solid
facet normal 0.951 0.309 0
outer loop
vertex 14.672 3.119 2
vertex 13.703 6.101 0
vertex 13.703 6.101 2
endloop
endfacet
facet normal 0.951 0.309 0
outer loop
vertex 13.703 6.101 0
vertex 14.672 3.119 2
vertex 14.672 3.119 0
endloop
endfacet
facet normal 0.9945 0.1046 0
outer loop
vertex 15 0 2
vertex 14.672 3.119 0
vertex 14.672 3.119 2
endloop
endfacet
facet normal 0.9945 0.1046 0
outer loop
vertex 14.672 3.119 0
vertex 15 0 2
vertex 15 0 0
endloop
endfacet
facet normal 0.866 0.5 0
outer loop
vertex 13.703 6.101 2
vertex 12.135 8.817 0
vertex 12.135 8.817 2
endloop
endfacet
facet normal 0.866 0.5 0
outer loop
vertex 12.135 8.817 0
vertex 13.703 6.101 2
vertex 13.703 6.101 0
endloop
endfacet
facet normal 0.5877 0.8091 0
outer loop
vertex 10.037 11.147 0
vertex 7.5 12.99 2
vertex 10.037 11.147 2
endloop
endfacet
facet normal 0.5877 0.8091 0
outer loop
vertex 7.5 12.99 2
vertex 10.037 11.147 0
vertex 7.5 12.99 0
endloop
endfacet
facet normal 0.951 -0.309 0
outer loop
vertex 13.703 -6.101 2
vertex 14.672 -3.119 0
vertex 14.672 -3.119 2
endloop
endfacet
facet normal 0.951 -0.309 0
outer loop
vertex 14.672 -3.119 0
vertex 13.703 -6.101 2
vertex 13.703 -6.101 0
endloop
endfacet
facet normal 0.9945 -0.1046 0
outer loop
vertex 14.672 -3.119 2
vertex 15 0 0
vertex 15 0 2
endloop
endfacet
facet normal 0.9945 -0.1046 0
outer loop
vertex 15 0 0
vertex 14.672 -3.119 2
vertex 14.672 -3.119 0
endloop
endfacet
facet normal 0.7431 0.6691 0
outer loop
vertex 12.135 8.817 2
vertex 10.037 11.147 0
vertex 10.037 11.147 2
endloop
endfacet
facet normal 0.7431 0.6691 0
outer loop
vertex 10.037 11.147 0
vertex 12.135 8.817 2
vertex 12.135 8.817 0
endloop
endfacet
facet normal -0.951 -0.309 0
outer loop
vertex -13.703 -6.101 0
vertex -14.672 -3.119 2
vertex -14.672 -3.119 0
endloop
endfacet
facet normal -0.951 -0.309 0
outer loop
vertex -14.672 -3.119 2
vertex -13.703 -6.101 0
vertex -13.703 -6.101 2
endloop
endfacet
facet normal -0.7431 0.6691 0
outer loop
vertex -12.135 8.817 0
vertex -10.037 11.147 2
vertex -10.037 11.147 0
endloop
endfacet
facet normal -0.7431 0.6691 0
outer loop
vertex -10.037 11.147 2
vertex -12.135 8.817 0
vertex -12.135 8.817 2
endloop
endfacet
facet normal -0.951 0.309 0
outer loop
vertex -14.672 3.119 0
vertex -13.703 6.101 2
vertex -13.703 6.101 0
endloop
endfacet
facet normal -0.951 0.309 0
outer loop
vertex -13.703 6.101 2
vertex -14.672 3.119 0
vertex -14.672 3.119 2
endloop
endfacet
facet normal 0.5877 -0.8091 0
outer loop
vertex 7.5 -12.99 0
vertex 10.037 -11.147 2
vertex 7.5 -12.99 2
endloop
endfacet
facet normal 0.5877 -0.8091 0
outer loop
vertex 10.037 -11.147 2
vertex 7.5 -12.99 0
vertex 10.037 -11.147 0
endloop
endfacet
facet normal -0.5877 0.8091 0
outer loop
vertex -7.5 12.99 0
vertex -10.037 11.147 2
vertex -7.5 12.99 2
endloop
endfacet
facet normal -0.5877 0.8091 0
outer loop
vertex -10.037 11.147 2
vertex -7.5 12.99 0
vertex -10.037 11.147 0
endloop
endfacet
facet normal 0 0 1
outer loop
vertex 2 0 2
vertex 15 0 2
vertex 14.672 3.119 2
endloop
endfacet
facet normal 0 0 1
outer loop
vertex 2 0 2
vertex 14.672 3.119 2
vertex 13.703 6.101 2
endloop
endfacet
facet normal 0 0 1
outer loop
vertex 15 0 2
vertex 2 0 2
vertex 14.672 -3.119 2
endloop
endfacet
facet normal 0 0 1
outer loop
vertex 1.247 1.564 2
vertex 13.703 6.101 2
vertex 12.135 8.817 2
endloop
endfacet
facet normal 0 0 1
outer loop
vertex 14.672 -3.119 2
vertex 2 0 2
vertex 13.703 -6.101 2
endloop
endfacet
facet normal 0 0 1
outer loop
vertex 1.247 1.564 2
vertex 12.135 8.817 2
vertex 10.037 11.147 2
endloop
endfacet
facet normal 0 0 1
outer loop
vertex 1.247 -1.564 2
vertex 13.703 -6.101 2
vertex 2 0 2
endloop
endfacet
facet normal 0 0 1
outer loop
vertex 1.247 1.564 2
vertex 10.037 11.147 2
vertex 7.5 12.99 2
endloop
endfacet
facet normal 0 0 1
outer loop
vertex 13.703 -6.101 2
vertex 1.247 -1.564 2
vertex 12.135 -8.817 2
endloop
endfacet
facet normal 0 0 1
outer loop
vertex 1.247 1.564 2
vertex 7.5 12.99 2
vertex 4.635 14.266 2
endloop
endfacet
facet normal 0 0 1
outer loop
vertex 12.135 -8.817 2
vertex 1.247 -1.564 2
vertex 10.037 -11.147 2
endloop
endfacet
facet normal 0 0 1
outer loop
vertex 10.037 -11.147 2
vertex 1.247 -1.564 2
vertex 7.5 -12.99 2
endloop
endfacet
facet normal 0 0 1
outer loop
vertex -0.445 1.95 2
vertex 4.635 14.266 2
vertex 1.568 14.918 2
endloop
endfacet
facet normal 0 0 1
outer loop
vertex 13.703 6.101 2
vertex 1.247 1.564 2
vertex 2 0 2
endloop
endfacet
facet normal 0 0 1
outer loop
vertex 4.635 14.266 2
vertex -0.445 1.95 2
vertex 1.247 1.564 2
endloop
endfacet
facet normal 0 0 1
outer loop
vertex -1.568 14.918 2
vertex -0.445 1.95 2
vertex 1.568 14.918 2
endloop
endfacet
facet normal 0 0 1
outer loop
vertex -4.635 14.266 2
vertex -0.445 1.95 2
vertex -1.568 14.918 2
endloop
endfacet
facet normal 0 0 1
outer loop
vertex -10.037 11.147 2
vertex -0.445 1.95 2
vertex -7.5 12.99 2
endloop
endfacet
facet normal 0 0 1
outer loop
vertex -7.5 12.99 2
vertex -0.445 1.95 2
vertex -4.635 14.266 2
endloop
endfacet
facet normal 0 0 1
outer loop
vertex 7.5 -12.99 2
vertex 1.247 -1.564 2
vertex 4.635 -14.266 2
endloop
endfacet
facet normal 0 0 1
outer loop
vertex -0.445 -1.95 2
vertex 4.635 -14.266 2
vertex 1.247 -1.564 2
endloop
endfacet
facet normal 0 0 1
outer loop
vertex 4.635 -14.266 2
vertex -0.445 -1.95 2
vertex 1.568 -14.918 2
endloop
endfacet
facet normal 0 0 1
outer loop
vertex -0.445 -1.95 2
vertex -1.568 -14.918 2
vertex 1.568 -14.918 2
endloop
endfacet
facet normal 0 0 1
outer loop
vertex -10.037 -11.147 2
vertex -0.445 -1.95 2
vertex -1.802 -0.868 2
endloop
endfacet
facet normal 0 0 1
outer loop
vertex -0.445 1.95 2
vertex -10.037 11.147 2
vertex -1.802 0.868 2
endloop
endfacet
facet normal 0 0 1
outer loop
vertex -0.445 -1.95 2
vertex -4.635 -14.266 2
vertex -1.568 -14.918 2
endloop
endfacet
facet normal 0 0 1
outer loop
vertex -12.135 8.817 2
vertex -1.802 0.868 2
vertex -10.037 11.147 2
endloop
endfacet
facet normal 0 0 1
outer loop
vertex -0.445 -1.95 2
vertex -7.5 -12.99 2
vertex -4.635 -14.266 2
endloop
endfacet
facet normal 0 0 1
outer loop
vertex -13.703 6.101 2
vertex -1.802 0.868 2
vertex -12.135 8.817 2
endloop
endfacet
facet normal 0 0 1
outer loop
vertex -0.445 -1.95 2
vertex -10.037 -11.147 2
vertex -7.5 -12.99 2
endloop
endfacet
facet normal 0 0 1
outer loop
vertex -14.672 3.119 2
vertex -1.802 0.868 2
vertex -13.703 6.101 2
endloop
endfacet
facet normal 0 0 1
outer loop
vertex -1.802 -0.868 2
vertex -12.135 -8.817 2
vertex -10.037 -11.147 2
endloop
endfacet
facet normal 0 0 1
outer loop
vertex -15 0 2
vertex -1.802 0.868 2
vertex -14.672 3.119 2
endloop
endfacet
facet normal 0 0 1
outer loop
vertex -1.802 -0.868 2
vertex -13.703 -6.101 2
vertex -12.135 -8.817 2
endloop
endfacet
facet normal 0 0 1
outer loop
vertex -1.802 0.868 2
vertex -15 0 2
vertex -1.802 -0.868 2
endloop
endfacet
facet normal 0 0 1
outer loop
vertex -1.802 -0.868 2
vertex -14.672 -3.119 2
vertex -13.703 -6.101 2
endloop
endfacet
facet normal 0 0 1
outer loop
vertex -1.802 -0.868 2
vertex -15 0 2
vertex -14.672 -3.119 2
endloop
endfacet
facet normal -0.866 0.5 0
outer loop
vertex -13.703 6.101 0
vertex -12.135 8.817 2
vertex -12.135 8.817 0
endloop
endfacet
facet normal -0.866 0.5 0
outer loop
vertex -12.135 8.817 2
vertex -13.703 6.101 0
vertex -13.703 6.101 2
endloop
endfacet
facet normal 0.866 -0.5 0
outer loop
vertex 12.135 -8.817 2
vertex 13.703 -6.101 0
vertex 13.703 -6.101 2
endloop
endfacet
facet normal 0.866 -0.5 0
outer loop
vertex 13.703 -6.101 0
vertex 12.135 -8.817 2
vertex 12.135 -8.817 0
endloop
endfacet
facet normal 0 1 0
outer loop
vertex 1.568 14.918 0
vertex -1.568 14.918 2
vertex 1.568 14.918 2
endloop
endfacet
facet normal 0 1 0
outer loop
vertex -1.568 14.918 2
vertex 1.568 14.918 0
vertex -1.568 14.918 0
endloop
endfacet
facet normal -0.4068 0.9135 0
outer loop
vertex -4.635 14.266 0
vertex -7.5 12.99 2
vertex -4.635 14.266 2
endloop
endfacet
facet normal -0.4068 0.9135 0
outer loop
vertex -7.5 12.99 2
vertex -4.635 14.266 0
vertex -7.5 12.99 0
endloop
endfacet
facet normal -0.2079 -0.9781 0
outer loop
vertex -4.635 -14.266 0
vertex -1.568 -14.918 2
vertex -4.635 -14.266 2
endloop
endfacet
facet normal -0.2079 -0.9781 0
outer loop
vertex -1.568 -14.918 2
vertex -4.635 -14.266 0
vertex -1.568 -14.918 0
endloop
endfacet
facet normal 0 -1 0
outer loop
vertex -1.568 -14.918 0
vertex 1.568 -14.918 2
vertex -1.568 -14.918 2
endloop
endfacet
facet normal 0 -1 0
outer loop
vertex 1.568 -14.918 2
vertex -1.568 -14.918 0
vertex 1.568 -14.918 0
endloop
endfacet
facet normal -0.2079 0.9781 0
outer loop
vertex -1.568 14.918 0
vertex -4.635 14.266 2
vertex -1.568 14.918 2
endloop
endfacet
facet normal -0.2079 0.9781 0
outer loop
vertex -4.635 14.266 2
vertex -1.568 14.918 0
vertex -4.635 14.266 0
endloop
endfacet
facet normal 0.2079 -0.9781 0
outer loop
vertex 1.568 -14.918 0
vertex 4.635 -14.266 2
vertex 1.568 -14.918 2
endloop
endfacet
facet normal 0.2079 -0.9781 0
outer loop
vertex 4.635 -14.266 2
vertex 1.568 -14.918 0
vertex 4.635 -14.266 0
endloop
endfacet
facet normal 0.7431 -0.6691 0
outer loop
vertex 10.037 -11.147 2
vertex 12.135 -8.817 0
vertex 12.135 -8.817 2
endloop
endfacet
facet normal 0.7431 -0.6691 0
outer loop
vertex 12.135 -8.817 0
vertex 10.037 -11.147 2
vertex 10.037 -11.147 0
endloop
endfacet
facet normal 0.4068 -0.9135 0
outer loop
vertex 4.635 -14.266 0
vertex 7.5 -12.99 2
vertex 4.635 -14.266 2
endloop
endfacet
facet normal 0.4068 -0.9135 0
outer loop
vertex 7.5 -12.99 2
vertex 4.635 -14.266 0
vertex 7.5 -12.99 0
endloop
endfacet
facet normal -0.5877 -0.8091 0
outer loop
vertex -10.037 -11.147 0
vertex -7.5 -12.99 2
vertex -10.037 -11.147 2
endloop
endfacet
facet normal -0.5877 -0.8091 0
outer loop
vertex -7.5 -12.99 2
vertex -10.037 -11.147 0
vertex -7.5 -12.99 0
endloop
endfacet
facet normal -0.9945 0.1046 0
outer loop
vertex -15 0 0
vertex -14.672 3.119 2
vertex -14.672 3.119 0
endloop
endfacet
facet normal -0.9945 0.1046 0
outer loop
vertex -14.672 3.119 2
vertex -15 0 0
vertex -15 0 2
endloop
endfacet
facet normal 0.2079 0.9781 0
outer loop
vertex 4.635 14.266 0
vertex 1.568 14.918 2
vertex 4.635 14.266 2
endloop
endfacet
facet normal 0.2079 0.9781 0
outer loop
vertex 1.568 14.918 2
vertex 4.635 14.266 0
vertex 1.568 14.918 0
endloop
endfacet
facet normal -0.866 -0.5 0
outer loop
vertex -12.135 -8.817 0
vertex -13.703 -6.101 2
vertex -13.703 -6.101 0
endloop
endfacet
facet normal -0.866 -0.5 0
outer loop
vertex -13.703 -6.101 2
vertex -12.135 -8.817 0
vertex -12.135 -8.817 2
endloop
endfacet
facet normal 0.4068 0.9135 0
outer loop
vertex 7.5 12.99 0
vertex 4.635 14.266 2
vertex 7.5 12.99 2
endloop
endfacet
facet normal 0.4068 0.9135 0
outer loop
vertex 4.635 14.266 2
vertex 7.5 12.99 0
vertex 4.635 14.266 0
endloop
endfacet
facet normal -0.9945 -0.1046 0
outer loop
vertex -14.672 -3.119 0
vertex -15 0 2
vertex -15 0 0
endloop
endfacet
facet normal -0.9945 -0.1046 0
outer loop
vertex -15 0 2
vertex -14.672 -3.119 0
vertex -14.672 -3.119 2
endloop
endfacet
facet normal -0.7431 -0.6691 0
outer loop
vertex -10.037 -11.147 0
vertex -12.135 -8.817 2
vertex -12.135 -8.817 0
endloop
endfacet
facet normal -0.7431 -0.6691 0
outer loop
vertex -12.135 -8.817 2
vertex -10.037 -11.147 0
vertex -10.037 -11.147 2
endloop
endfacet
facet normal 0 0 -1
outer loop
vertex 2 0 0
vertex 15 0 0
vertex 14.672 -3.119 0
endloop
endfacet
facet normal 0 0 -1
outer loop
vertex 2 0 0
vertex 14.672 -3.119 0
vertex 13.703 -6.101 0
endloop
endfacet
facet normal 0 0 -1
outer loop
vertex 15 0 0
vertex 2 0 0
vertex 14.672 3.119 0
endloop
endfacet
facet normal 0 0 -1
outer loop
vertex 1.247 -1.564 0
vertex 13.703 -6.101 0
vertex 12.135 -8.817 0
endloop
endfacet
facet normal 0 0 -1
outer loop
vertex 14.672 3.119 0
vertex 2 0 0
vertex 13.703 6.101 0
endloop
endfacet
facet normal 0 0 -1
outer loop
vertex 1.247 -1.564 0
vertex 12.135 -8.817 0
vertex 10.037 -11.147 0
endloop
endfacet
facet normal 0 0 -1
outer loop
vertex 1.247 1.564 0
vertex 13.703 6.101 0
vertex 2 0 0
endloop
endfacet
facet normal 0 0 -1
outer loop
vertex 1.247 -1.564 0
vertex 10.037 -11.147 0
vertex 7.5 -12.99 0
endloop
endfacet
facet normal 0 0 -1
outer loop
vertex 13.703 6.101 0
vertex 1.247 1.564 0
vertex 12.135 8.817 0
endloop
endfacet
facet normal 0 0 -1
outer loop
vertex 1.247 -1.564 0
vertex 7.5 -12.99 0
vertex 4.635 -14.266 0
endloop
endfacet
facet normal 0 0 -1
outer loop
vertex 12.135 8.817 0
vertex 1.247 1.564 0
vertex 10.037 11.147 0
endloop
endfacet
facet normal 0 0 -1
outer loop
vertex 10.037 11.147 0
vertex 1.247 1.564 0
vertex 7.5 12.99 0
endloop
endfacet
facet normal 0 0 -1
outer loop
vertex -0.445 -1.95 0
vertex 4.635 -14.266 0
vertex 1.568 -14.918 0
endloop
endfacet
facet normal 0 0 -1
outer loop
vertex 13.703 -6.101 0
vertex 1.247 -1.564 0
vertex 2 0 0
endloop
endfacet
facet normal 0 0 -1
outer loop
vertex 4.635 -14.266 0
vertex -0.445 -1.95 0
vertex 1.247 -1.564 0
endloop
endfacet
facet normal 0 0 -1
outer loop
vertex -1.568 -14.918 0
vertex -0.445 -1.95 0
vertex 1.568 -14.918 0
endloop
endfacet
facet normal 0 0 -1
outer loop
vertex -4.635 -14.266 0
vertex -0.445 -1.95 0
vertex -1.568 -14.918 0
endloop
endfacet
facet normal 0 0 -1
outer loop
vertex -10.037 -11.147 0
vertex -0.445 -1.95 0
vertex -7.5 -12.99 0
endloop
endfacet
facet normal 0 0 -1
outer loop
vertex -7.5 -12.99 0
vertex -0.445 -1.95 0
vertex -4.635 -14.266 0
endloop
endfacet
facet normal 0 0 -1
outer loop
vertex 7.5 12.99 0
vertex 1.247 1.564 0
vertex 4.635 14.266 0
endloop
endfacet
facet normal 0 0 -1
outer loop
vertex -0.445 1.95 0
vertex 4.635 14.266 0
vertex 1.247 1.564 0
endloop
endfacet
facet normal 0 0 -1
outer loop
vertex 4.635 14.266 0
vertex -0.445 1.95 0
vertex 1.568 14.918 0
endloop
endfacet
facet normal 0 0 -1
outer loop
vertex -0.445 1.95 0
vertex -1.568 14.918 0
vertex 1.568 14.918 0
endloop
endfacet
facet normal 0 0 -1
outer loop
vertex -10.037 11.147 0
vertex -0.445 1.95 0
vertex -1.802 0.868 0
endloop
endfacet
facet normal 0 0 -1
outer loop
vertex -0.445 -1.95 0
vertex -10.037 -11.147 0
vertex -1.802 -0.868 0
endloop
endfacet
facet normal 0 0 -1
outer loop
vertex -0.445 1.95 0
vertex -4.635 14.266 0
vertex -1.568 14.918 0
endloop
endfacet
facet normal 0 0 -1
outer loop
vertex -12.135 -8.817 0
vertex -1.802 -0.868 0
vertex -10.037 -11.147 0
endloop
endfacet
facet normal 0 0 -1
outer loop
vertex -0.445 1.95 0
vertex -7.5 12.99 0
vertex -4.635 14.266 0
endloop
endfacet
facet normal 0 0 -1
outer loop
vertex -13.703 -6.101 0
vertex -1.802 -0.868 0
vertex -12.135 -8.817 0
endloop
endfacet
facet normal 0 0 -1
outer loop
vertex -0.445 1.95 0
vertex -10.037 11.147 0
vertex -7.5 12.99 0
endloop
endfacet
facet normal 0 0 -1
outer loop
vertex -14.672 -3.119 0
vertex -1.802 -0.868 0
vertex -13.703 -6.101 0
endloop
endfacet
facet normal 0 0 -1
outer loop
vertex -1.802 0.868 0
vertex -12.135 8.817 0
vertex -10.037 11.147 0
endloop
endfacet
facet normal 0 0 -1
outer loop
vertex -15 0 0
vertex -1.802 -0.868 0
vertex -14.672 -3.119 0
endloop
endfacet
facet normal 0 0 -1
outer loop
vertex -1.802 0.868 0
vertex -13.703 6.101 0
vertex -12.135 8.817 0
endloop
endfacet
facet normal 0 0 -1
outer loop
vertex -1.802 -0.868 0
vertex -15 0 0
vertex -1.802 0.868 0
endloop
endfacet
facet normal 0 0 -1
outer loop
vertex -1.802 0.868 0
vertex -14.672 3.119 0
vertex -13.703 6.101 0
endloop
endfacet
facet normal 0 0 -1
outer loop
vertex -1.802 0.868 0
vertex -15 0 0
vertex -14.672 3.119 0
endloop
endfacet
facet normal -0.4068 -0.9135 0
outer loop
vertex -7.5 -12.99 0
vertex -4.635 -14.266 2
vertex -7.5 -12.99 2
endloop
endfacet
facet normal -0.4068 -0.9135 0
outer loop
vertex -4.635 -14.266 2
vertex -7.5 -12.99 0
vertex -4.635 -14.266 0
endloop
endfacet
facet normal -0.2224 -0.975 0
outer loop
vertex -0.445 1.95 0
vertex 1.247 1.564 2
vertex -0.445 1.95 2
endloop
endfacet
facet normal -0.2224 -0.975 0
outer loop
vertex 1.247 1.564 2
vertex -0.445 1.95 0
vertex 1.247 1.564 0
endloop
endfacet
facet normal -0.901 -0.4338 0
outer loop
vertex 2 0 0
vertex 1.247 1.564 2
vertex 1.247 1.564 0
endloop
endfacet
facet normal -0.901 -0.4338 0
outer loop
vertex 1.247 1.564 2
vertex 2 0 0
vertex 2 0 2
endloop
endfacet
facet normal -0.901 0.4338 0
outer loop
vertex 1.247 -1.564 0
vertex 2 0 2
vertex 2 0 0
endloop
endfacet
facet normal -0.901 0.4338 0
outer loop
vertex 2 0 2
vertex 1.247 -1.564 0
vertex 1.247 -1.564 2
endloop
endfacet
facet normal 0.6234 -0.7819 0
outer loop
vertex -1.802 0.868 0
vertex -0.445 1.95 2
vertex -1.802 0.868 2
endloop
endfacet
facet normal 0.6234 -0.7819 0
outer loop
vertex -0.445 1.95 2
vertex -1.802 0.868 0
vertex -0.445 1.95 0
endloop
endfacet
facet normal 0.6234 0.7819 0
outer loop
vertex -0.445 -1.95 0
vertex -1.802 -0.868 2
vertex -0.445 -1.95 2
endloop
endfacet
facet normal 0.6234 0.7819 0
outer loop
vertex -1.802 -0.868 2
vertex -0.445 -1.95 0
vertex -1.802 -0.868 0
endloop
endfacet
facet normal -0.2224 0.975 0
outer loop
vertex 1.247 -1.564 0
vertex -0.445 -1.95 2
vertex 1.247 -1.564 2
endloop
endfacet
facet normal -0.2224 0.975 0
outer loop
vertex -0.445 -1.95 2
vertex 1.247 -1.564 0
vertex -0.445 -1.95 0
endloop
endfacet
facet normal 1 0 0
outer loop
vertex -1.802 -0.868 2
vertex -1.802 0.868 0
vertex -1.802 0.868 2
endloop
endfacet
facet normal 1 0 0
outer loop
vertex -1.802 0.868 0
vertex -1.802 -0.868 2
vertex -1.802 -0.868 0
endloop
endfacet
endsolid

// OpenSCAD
use <MCAD/2Dshapes.scad>;

base_height = 2;
segment_height = 1;
disk_radius = 15;
hole_radius = 2;
num_segments = 4;
color("black") ;
difference() {
    union(){
        color("white") cylinder(h=base_height, r=disk_radius);
        
        translate([0,0,base_height+0.01])
        color("black") union() {
            linear_extrude(height = segment_height)
            for (i = [0 : 2 : num_segments])
                pieSlice(size=[disk_radius, disk_radius], start_angle=360/num_segments*i, end_angle=360/num_segments*(i+1));
        }
    }
    translate([0,0,-0.01]) cylinder(h=base_height*10, r=hole_radius);
};
